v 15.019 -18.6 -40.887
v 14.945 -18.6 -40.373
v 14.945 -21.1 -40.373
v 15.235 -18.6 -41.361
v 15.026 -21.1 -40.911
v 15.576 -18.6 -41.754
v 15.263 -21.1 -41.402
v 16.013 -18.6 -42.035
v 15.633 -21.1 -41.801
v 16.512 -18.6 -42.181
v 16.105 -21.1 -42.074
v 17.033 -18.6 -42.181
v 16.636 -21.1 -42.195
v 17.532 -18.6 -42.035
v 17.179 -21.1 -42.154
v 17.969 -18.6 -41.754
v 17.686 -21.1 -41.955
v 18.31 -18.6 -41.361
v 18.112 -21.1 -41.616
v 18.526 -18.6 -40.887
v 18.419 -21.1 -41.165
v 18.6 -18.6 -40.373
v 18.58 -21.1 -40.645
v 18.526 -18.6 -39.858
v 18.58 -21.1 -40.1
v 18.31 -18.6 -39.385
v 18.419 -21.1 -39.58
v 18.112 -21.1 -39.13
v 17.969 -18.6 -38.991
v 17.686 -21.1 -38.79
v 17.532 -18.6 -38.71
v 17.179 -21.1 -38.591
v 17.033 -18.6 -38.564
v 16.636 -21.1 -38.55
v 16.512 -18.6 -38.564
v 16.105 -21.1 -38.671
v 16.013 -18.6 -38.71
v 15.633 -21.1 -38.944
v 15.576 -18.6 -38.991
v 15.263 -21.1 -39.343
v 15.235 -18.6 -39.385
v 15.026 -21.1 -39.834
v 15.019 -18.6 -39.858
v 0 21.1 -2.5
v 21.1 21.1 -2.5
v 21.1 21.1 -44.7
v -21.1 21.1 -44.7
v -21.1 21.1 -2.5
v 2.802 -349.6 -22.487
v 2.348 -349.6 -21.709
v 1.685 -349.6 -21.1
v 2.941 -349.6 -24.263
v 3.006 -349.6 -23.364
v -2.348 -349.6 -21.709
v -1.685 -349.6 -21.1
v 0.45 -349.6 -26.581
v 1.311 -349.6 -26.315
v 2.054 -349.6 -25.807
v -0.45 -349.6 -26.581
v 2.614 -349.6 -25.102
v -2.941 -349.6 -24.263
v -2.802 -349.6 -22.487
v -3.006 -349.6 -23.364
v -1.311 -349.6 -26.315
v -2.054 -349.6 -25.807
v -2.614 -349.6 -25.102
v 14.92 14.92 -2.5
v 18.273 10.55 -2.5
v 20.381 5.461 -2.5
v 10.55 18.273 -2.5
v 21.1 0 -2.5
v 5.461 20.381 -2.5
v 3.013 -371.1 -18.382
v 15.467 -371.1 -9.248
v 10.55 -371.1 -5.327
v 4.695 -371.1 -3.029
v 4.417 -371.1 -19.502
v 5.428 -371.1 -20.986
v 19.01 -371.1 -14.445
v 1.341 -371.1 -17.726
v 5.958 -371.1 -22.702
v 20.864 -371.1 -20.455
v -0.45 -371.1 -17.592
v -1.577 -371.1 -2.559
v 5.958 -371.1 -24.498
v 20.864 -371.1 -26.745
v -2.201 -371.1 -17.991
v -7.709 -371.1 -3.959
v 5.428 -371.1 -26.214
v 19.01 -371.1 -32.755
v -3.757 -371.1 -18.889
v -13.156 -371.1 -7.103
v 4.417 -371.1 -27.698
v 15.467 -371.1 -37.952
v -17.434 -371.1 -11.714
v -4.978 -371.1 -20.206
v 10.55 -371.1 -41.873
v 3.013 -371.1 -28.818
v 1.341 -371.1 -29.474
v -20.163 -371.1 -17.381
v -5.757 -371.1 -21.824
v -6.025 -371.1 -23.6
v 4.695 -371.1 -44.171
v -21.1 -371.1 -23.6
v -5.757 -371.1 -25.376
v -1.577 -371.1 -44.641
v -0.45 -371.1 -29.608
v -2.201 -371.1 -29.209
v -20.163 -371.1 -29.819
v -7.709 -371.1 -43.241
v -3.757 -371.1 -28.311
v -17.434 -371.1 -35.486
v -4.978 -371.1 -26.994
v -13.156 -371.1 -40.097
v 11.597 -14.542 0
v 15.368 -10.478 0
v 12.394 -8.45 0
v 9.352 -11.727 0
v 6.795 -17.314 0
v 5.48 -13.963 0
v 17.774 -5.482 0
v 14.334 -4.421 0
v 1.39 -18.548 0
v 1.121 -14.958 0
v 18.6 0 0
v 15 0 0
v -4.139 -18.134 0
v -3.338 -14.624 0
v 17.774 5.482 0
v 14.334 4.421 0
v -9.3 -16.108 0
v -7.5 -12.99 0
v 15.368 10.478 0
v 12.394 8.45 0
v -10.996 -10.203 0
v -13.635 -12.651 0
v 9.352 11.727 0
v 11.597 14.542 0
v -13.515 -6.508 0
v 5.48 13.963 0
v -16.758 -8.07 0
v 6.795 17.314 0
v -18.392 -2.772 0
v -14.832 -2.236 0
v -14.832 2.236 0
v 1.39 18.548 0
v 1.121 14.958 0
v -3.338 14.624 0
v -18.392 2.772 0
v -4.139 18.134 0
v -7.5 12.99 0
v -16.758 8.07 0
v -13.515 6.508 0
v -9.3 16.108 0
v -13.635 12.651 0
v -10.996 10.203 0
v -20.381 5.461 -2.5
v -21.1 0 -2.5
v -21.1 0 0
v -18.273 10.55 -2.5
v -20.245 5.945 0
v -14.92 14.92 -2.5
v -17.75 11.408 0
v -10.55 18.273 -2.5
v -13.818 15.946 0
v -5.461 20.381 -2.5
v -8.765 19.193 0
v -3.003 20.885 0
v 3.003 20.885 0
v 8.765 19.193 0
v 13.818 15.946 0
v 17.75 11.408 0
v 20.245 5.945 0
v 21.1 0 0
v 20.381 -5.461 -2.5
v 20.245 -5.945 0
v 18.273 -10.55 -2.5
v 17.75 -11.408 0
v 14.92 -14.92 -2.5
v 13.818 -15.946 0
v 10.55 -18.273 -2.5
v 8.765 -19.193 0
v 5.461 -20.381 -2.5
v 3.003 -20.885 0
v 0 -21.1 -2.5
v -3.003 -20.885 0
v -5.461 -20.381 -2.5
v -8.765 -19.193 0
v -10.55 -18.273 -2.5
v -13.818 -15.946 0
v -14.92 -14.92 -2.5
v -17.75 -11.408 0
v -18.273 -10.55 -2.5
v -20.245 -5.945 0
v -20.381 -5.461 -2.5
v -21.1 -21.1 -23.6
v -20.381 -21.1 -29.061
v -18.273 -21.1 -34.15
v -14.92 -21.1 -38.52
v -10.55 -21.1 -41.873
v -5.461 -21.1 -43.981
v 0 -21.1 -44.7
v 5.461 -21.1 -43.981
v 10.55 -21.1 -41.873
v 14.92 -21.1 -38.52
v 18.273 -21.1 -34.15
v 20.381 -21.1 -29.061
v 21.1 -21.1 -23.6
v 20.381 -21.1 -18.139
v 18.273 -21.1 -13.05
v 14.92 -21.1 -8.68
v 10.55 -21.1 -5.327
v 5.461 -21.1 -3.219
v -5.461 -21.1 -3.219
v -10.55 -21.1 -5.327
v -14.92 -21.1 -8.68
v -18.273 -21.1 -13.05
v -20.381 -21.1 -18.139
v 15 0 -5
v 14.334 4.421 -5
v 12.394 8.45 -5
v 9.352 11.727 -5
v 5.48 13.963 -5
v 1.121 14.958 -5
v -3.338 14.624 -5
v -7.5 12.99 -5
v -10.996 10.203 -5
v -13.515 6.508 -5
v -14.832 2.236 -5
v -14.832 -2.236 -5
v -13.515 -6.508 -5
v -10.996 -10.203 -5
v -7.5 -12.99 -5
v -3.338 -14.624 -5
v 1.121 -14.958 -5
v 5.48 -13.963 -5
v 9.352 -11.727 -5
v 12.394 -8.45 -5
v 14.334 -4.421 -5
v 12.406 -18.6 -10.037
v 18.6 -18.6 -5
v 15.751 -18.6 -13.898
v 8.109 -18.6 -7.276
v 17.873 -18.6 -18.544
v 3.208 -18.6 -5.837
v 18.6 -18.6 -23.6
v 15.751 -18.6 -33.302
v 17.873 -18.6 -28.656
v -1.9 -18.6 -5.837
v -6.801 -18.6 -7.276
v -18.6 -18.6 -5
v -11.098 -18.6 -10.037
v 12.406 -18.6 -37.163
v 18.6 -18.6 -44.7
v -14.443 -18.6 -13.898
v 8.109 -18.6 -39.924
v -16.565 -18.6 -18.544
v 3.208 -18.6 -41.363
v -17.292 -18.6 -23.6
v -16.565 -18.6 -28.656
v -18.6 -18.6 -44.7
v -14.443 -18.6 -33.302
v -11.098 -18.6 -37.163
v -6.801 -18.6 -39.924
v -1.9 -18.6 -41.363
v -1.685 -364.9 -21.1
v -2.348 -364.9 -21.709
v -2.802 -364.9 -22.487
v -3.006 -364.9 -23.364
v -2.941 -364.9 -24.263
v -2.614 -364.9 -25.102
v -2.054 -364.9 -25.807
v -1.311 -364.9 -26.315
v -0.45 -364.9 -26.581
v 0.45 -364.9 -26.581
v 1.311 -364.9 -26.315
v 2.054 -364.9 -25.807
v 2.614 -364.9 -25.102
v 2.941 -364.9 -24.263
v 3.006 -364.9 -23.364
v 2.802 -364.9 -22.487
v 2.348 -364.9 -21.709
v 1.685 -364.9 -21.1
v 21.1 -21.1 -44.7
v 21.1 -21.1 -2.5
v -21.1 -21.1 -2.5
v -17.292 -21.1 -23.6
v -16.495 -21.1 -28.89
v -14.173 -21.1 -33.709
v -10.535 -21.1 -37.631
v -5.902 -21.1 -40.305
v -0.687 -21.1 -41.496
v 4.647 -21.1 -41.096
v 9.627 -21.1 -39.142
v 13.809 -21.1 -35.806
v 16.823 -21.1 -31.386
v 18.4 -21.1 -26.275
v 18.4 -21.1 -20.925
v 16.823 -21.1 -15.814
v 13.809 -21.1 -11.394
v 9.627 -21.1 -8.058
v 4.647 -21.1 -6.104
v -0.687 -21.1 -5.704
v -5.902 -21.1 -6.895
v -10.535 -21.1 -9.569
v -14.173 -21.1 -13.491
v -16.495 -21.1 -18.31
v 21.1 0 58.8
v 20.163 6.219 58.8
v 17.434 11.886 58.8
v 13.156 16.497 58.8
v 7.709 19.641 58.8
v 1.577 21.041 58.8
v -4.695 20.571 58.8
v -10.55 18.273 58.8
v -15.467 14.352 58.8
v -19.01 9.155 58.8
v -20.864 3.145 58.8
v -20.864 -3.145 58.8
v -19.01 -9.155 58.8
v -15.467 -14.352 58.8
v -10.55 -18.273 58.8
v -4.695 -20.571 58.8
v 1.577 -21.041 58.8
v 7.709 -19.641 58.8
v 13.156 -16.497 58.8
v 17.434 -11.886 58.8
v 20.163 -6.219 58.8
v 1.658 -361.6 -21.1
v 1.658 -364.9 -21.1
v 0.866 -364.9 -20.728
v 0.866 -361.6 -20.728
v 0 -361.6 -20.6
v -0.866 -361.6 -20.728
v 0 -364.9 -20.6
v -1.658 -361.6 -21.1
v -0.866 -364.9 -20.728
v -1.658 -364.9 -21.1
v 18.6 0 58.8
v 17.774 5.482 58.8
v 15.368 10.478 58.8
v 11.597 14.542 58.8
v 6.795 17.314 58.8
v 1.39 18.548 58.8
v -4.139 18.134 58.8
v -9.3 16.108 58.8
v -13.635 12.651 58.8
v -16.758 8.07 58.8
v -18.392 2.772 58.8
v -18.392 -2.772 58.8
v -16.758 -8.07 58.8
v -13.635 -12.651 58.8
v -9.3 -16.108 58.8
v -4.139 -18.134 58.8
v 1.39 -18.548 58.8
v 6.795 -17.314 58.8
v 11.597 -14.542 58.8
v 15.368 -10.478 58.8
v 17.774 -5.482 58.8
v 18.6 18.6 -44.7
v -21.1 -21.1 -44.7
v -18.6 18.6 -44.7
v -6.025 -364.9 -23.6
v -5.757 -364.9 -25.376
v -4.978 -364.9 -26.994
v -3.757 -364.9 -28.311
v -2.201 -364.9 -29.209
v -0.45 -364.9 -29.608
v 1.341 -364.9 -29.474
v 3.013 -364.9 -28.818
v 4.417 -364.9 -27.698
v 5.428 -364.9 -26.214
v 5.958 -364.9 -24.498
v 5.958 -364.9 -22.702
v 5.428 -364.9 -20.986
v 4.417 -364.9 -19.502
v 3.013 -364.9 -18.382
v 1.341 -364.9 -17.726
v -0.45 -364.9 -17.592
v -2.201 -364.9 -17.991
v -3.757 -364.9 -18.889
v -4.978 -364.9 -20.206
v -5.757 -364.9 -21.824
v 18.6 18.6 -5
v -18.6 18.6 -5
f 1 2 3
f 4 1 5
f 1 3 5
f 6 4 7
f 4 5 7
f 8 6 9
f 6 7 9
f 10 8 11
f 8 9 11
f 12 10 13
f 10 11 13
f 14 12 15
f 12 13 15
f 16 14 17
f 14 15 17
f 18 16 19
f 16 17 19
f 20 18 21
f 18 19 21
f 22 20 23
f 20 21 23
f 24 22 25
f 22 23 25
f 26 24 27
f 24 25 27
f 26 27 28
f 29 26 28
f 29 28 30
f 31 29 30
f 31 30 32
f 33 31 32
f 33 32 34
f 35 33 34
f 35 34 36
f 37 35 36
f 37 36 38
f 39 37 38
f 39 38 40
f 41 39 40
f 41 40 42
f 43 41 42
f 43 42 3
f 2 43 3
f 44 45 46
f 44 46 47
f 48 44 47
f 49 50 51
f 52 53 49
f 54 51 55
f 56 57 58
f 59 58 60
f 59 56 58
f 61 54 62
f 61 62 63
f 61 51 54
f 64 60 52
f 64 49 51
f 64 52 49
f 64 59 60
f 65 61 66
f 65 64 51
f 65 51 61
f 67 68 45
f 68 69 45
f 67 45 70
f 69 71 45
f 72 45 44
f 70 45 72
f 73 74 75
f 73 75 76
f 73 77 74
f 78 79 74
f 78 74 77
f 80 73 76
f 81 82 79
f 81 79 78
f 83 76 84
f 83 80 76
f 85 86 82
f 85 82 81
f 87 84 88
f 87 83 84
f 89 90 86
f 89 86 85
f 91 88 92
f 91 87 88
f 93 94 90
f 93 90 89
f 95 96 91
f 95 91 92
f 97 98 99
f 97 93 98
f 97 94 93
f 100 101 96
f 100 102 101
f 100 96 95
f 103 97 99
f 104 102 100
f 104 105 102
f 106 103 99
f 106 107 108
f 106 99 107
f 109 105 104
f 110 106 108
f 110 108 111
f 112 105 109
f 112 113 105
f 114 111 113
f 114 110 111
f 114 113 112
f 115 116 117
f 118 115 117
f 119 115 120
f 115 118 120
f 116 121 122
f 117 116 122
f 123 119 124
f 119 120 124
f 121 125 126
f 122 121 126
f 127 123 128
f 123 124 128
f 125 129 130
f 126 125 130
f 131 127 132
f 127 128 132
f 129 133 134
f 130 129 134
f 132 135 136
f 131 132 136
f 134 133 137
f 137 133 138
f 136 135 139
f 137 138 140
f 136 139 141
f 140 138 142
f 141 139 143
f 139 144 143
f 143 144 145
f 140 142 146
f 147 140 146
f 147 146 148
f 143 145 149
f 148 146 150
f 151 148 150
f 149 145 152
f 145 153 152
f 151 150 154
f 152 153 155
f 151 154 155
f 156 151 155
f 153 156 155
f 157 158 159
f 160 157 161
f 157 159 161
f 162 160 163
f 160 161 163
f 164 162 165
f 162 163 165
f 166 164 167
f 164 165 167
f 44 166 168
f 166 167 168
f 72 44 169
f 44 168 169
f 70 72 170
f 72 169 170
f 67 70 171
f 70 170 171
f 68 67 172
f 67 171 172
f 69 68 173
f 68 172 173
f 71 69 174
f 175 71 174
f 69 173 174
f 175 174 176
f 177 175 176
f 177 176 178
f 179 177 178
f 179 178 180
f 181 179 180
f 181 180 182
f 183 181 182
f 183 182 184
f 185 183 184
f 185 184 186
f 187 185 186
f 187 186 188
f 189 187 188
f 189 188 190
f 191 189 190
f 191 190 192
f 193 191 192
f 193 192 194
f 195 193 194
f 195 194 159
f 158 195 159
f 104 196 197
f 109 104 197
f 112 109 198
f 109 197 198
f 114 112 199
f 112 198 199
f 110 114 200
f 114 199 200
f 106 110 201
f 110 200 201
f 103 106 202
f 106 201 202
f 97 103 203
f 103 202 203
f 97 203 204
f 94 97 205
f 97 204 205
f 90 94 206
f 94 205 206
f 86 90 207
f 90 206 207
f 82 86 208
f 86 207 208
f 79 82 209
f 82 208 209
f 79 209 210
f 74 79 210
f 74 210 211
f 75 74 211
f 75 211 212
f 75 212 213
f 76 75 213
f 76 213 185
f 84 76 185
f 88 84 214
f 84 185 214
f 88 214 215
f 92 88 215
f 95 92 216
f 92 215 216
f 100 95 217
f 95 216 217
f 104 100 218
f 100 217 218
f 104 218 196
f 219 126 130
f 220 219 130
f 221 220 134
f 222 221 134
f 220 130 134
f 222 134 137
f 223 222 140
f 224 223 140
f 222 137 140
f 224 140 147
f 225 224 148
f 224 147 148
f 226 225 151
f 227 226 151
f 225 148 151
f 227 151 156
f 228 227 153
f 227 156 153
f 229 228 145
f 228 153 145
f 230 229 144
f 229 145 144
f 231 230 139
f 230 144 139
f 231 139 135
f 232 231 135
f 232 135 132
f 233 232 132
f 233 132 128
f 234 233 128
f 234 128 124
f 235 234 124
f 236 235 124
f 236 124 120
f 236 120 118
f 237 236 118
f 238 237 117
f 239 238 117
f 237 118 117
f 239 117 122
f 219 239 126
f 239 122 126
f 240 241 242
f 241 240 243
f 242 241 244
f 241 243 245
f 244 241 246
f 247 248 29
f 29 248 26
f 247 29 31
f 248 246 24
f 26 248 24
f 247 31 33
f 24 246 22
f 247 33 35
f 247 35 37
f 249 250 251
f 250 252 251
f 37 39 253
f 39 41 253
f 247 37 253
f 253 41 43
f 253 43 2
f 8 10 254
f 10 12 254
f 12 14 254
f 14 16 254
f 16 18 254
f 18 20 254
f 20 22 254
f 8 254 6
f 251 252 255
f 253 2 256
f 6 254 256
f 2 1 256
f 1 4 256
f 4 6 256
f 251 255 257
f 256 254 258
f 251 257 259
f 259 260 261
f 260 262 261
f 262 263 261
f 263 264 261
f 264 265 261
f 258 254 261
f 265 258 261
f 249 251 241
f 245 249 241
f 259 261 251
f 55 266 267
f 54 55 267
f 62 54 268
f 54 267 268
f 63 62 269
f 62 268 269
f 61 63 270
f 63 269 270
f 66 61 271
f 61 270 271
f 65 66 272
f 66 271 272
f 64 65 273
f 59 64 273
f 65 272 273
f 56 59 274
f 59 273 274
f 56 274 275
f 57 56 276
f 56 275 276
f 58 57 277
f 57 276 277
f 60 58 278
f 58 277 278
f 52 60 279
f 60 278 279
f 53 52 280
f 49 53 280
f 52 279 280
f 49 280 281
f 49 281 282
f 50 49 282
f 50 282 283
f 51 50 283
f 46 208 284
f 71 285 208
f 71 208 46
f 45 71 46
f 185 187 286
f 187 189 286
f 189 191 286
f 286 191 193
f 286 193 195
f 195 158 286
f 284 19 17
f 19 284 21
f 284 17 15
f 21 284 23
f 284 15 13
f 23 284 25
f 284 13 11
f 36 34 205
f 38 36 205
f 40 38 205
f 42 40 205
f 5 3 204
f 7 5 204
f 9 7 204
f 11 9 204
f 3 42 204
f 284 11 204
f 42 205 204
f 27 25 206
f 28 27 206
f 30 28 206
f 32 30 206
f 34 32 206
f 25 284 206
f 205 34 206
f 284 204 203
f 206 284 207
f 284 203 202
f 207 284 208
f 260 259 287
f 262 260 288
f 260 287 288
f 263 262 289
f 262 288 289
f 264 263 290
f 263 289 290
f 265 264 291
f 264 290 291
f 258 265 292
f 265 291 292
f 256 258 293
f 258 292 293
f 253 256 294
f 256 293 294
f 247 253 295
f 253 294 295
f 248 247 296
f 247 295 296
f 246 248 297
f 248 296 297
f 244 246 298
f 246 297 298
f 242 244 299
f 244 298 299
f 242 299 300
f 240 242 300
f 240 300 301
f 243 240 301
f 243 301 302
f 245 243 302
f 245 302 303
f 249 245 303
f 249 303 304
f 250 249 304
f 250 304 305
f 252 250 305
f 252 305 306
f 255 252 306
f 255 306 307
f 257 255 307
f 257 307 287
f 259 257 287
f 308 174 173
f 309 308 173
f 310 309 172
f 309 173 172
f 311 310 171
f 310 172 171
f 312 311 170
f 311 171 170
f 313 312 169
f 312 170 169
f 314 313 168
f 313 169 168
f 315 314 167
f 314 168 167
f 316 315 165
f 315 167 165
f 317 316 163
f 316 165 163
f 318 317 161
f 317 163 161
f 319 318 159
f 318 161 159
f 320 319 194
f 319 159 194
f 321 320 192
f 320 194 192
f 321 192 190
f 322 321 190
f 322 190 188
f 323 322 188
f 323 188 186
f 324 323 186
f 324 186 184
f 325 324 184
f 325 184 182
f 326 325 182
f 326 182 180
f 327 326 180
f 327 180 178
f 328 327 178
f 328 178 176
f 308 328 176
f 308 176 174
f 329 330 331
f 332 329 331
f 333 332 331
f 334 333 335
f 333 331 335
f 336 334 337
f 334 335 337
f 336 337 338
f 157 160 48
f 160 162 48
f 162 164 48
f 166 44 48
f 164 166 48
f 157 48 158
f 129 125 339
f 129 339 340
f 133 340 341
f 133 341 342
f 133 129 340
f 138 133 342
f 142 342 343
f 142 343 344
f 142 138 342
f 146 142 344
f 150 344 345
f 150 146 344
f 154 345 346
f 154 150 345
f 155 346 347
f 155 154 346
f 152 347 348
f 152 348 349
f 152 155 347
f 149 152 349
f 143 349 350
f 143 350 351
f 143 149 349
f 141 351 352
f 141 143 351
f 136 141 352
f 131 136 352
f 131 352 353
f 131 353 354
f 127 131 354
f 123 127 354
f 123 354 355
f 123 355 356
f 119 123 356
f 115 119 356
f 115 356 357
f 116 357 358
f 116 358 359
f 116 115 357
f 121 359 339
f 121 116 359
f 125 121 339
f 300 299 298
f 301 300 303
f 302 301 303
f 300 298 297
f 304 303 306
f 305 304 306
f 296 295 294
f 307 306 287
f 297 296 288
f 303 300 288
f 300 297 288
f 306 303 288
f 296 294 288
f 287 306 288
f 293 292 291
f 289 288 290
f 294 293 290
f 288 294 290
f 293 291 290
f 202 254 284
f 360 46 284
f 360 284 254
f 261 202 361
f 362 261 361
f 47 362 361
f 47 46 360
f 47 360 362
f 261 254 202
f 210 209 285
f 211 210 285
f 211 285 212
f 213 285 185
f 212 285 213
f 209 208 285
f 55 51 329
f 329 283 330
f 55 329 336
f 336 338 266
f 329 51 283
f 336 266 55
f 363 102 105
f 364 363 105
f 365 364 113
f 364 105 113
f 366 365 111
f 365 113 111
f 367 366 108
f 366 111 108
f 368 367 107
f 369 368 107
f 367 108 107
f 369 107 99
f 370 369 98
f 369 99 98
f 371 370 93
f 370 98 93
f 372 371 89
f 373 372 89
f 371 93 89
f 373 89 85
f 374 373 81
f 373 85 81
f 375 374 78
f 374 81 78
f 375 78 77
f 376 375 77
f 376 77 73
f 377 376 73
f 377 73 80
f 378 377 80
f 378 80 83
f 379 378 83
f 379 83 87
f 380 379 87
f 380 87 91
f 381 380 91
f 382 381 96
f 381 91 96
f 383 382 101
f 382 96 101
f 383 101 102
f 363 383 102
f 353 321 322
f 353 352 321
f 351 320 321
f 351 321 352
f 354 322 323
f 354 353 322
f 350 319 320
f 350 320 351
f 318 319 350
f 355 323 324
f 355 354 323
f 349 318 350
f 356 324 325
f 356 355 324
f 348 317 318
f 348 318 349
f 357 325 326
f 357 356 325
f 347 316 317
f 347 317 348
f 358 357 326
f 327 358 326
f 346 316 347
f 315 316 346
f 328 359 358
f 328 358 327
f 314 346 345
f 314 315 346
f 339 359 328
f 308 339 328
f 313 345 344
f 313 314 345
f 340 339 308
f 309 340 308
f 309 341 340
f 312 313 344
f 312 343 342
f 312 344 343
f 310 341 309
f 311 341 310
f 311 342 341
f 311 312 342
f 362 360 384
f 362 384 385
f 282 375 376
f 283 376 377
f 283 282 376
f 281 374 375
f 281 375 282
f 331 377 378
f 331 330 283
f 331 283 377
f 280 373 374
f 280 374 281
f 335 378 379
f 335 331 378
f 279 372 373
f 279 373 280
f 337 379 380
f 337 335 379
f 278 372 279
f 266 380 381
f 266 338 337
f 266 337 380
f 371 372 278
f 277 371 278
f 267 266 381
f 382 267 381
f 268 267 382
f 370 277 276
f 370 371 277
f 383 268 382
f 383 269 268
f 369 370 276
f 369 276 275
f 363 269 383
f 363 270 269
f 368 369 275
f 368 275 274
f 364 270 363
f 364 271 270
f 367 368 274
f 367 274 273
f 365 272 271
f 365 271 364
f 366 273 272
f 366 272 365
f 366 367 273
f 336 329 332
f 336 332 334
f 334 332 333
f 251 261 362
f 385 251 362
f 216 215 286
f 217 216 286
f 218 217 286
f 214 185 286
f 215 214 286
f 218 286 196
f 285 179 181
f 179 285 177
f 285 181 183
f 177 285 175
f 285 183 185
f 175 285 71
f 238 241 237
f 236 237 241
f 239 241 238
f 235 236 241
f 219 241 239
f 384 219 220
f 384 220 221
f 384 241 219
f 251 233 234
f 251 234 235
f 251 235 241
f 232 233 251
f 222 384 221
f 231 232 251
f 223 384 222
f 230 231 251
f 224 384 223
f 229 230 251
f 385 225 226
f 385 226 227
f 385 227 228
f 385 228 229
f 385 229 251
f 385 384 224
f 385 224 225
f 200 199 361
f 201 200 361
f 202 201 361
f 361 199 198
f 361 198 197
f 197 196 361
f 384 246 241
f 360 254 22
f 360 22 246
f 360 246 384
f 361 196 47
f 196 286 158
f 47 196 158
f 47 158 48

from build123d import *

# Parameters (mm, degrees)
SKETCH1_R           = 21.1
SKETCH1_R_2         = 18.6
BOSS_EXTRUDE4_DEPTH = 58.8
SKETCH4_R           = 21.1
BOSS_EXTRUDE5_DEPTH = 2.5
SKETCH12_W          = 42.2
SKETCH12_H          = 42.2
BOSS_EXTRUDE6_DEPTH = 42.2
SKETCH13_R          = 21.1
BOSS_EXTRUDE7_DEPTH = 350
CUT_EXTRUDE1_DEPTH  = 21.5
SKETCH15_R          = 3
CUT_EXTRUDE2_DEPTH  = 9.5
SKETCH16_R          = 6.025
CUT_EXTRUDE3_DEPTH  = 6.2
SKETCH17_W          = 37.2
SKETCH17_H          = 37.2
CUT_EXTRUDE4_DEPTH  = 39.7
SKETCH18_R          = 15
CUT_EXTRUDE5_DEPTH  = 5
SKETCH19_R          = 1.827460326
CUT_EXTRUDE6_DEPTH  = 2.5
SKETCH23_R          = 17.945895708
CUT_EXTRUDE7_DEPTH  = 2.5


with BuildPart() as part:
    # Sketch1 → Boss-Extrude4 (new body)
    with BuildSketch(Plane.XY):
        Circle(SKETCH1_R)
        Circle(SKETCH1_R_2, mode=Mode.SUBTRACT)
    extrude(amount=BOSS_EXTRUDE4_DEPTH)

    # Sketch4 → Boss-Extrude5 (add)
    with BuildSketch(Plane(origin=(0, 0, 0), x_dir=(-1, 0, 0), z_dir=(0, 0, -1))):
        Circle(SKETCH4_R)
    extrude(amount=BOSS_EXTRUDE5_DEPTH)

    # Sketch12 → Boss-Extrude6 (add)
    with BuildSketch(Plane(origin=(0, 0, -2.5), x_dir=(-1, 0, 0), z_dir=(0, 0, -1))):
        Rectangle(SKETCH12_W, SKETCH12_H)
    extrude(amount=BOSS_EXTRUDE6_DEPTH)

    # Sketch13 → Boss-Extrude7 (add)
    with BuildSketch(Plane(origin=(0, -21.1, 0), x_dir=(-1, 0, 0), z_dir=(0, -1, 0))):
        with Locations((0, 23.6)):
            Circle(SKETCH13_R)
    extrude(amount=BOSS_EXTRUDE7_DEPTH)

    # Sketch14 → Cut-Extrude1 (cut)
    with BuildSketch(Plane(origin=(0, -371.1, 0), x_dir=(-1, 0, 0), z_dir=(0, -1, 0))):
        with BuildLine():
            Line((-1.68529671, 21.1), (1.68529671, 21.1))
            ThreePointArc((1.68529671, 21.1), (0, 26.615), (-1.68529671, 21.1))
        make_face()
    extrude(amount=-CUT_EXTRUDE1_DEPTH, mode=Mode.SUBTRACT)

    # Sketch15 → Cut-Extrude2 (cut)
    with BuildSketch(Plane(origin=(0, -371.1, 0), x_dir=(-1, 0, 0), z_dir=(0, -1, 0))):
        with Locations((0, 23.6)):
            Circle(SKETCH15_R)
    extrude(amount=-CUT_EXTRUDE2_DEPTH, mode=Mode.SUBTRACT)

    # Sketch16 → Cut-Extrude3 (cut)
    with BuildSketch(Plane(origin=(0, -371.1, 0), x_dir=(-1, 0, 0), z_dir=(0, -1, 0))):
        with Locations((0, 23.6)):
            Circle(SKETCH16_R)
    extrude(amount=-CUT_EXTRUDE3_DEPTH, mode=Mode.SUBTRACT)

    # Sketch17 → Cut-Extrude4 (cut)
    with BuildSketch(Plane(origin=(0, 0, -44.7), x_dir=(-1, 0, 0), z_dir=(0, 0, -1))):
        Rectangle(SKETCH17_W, SKETCH17_H)
    extrude(amount=-CUT_EXTRUDE4_DEPTH, mode=Mode.SUBTRACT)

    # Sketch18 → Cut-Extrude5 (cut)
    with BuildSketch(Plane.XY):
        Circle(SKETCH18_R)
    extrude(amount=-CUT_EXTRUDE5_DEPTH, mode=Mode.SUBTRACT)

    # Sketch19 → Cut-Extrude6 (cut)
    with BuildSketch(Plane(origin=(0, -21.1, 0), x_dir=(-1, 0, 0), z_dir=(0, -1, 0))):
        with Locations((-16.772539674, 40.372539674)):
            Circle(SKETCH19_R)
    extrude(amount=-CUT_EXTRUDE6_DEPTH, mode=Mode.SUBTRACT)

    # Sketch23 → Cut-Extrude7 (cut)
    with BuildSketch(Plane(origin=(0, -21.1, 0), x_dir=(-1, 0, 0), z_dir=(0, -1, 0))):
        with Locations((-0.654104292, 23.6)):
            Circle(SKETCH23_R)
    extrude(amount=-CUT_EXTRUDE7_DEPTH, mode=Mode.SUBTRACT)


solid = part.part
